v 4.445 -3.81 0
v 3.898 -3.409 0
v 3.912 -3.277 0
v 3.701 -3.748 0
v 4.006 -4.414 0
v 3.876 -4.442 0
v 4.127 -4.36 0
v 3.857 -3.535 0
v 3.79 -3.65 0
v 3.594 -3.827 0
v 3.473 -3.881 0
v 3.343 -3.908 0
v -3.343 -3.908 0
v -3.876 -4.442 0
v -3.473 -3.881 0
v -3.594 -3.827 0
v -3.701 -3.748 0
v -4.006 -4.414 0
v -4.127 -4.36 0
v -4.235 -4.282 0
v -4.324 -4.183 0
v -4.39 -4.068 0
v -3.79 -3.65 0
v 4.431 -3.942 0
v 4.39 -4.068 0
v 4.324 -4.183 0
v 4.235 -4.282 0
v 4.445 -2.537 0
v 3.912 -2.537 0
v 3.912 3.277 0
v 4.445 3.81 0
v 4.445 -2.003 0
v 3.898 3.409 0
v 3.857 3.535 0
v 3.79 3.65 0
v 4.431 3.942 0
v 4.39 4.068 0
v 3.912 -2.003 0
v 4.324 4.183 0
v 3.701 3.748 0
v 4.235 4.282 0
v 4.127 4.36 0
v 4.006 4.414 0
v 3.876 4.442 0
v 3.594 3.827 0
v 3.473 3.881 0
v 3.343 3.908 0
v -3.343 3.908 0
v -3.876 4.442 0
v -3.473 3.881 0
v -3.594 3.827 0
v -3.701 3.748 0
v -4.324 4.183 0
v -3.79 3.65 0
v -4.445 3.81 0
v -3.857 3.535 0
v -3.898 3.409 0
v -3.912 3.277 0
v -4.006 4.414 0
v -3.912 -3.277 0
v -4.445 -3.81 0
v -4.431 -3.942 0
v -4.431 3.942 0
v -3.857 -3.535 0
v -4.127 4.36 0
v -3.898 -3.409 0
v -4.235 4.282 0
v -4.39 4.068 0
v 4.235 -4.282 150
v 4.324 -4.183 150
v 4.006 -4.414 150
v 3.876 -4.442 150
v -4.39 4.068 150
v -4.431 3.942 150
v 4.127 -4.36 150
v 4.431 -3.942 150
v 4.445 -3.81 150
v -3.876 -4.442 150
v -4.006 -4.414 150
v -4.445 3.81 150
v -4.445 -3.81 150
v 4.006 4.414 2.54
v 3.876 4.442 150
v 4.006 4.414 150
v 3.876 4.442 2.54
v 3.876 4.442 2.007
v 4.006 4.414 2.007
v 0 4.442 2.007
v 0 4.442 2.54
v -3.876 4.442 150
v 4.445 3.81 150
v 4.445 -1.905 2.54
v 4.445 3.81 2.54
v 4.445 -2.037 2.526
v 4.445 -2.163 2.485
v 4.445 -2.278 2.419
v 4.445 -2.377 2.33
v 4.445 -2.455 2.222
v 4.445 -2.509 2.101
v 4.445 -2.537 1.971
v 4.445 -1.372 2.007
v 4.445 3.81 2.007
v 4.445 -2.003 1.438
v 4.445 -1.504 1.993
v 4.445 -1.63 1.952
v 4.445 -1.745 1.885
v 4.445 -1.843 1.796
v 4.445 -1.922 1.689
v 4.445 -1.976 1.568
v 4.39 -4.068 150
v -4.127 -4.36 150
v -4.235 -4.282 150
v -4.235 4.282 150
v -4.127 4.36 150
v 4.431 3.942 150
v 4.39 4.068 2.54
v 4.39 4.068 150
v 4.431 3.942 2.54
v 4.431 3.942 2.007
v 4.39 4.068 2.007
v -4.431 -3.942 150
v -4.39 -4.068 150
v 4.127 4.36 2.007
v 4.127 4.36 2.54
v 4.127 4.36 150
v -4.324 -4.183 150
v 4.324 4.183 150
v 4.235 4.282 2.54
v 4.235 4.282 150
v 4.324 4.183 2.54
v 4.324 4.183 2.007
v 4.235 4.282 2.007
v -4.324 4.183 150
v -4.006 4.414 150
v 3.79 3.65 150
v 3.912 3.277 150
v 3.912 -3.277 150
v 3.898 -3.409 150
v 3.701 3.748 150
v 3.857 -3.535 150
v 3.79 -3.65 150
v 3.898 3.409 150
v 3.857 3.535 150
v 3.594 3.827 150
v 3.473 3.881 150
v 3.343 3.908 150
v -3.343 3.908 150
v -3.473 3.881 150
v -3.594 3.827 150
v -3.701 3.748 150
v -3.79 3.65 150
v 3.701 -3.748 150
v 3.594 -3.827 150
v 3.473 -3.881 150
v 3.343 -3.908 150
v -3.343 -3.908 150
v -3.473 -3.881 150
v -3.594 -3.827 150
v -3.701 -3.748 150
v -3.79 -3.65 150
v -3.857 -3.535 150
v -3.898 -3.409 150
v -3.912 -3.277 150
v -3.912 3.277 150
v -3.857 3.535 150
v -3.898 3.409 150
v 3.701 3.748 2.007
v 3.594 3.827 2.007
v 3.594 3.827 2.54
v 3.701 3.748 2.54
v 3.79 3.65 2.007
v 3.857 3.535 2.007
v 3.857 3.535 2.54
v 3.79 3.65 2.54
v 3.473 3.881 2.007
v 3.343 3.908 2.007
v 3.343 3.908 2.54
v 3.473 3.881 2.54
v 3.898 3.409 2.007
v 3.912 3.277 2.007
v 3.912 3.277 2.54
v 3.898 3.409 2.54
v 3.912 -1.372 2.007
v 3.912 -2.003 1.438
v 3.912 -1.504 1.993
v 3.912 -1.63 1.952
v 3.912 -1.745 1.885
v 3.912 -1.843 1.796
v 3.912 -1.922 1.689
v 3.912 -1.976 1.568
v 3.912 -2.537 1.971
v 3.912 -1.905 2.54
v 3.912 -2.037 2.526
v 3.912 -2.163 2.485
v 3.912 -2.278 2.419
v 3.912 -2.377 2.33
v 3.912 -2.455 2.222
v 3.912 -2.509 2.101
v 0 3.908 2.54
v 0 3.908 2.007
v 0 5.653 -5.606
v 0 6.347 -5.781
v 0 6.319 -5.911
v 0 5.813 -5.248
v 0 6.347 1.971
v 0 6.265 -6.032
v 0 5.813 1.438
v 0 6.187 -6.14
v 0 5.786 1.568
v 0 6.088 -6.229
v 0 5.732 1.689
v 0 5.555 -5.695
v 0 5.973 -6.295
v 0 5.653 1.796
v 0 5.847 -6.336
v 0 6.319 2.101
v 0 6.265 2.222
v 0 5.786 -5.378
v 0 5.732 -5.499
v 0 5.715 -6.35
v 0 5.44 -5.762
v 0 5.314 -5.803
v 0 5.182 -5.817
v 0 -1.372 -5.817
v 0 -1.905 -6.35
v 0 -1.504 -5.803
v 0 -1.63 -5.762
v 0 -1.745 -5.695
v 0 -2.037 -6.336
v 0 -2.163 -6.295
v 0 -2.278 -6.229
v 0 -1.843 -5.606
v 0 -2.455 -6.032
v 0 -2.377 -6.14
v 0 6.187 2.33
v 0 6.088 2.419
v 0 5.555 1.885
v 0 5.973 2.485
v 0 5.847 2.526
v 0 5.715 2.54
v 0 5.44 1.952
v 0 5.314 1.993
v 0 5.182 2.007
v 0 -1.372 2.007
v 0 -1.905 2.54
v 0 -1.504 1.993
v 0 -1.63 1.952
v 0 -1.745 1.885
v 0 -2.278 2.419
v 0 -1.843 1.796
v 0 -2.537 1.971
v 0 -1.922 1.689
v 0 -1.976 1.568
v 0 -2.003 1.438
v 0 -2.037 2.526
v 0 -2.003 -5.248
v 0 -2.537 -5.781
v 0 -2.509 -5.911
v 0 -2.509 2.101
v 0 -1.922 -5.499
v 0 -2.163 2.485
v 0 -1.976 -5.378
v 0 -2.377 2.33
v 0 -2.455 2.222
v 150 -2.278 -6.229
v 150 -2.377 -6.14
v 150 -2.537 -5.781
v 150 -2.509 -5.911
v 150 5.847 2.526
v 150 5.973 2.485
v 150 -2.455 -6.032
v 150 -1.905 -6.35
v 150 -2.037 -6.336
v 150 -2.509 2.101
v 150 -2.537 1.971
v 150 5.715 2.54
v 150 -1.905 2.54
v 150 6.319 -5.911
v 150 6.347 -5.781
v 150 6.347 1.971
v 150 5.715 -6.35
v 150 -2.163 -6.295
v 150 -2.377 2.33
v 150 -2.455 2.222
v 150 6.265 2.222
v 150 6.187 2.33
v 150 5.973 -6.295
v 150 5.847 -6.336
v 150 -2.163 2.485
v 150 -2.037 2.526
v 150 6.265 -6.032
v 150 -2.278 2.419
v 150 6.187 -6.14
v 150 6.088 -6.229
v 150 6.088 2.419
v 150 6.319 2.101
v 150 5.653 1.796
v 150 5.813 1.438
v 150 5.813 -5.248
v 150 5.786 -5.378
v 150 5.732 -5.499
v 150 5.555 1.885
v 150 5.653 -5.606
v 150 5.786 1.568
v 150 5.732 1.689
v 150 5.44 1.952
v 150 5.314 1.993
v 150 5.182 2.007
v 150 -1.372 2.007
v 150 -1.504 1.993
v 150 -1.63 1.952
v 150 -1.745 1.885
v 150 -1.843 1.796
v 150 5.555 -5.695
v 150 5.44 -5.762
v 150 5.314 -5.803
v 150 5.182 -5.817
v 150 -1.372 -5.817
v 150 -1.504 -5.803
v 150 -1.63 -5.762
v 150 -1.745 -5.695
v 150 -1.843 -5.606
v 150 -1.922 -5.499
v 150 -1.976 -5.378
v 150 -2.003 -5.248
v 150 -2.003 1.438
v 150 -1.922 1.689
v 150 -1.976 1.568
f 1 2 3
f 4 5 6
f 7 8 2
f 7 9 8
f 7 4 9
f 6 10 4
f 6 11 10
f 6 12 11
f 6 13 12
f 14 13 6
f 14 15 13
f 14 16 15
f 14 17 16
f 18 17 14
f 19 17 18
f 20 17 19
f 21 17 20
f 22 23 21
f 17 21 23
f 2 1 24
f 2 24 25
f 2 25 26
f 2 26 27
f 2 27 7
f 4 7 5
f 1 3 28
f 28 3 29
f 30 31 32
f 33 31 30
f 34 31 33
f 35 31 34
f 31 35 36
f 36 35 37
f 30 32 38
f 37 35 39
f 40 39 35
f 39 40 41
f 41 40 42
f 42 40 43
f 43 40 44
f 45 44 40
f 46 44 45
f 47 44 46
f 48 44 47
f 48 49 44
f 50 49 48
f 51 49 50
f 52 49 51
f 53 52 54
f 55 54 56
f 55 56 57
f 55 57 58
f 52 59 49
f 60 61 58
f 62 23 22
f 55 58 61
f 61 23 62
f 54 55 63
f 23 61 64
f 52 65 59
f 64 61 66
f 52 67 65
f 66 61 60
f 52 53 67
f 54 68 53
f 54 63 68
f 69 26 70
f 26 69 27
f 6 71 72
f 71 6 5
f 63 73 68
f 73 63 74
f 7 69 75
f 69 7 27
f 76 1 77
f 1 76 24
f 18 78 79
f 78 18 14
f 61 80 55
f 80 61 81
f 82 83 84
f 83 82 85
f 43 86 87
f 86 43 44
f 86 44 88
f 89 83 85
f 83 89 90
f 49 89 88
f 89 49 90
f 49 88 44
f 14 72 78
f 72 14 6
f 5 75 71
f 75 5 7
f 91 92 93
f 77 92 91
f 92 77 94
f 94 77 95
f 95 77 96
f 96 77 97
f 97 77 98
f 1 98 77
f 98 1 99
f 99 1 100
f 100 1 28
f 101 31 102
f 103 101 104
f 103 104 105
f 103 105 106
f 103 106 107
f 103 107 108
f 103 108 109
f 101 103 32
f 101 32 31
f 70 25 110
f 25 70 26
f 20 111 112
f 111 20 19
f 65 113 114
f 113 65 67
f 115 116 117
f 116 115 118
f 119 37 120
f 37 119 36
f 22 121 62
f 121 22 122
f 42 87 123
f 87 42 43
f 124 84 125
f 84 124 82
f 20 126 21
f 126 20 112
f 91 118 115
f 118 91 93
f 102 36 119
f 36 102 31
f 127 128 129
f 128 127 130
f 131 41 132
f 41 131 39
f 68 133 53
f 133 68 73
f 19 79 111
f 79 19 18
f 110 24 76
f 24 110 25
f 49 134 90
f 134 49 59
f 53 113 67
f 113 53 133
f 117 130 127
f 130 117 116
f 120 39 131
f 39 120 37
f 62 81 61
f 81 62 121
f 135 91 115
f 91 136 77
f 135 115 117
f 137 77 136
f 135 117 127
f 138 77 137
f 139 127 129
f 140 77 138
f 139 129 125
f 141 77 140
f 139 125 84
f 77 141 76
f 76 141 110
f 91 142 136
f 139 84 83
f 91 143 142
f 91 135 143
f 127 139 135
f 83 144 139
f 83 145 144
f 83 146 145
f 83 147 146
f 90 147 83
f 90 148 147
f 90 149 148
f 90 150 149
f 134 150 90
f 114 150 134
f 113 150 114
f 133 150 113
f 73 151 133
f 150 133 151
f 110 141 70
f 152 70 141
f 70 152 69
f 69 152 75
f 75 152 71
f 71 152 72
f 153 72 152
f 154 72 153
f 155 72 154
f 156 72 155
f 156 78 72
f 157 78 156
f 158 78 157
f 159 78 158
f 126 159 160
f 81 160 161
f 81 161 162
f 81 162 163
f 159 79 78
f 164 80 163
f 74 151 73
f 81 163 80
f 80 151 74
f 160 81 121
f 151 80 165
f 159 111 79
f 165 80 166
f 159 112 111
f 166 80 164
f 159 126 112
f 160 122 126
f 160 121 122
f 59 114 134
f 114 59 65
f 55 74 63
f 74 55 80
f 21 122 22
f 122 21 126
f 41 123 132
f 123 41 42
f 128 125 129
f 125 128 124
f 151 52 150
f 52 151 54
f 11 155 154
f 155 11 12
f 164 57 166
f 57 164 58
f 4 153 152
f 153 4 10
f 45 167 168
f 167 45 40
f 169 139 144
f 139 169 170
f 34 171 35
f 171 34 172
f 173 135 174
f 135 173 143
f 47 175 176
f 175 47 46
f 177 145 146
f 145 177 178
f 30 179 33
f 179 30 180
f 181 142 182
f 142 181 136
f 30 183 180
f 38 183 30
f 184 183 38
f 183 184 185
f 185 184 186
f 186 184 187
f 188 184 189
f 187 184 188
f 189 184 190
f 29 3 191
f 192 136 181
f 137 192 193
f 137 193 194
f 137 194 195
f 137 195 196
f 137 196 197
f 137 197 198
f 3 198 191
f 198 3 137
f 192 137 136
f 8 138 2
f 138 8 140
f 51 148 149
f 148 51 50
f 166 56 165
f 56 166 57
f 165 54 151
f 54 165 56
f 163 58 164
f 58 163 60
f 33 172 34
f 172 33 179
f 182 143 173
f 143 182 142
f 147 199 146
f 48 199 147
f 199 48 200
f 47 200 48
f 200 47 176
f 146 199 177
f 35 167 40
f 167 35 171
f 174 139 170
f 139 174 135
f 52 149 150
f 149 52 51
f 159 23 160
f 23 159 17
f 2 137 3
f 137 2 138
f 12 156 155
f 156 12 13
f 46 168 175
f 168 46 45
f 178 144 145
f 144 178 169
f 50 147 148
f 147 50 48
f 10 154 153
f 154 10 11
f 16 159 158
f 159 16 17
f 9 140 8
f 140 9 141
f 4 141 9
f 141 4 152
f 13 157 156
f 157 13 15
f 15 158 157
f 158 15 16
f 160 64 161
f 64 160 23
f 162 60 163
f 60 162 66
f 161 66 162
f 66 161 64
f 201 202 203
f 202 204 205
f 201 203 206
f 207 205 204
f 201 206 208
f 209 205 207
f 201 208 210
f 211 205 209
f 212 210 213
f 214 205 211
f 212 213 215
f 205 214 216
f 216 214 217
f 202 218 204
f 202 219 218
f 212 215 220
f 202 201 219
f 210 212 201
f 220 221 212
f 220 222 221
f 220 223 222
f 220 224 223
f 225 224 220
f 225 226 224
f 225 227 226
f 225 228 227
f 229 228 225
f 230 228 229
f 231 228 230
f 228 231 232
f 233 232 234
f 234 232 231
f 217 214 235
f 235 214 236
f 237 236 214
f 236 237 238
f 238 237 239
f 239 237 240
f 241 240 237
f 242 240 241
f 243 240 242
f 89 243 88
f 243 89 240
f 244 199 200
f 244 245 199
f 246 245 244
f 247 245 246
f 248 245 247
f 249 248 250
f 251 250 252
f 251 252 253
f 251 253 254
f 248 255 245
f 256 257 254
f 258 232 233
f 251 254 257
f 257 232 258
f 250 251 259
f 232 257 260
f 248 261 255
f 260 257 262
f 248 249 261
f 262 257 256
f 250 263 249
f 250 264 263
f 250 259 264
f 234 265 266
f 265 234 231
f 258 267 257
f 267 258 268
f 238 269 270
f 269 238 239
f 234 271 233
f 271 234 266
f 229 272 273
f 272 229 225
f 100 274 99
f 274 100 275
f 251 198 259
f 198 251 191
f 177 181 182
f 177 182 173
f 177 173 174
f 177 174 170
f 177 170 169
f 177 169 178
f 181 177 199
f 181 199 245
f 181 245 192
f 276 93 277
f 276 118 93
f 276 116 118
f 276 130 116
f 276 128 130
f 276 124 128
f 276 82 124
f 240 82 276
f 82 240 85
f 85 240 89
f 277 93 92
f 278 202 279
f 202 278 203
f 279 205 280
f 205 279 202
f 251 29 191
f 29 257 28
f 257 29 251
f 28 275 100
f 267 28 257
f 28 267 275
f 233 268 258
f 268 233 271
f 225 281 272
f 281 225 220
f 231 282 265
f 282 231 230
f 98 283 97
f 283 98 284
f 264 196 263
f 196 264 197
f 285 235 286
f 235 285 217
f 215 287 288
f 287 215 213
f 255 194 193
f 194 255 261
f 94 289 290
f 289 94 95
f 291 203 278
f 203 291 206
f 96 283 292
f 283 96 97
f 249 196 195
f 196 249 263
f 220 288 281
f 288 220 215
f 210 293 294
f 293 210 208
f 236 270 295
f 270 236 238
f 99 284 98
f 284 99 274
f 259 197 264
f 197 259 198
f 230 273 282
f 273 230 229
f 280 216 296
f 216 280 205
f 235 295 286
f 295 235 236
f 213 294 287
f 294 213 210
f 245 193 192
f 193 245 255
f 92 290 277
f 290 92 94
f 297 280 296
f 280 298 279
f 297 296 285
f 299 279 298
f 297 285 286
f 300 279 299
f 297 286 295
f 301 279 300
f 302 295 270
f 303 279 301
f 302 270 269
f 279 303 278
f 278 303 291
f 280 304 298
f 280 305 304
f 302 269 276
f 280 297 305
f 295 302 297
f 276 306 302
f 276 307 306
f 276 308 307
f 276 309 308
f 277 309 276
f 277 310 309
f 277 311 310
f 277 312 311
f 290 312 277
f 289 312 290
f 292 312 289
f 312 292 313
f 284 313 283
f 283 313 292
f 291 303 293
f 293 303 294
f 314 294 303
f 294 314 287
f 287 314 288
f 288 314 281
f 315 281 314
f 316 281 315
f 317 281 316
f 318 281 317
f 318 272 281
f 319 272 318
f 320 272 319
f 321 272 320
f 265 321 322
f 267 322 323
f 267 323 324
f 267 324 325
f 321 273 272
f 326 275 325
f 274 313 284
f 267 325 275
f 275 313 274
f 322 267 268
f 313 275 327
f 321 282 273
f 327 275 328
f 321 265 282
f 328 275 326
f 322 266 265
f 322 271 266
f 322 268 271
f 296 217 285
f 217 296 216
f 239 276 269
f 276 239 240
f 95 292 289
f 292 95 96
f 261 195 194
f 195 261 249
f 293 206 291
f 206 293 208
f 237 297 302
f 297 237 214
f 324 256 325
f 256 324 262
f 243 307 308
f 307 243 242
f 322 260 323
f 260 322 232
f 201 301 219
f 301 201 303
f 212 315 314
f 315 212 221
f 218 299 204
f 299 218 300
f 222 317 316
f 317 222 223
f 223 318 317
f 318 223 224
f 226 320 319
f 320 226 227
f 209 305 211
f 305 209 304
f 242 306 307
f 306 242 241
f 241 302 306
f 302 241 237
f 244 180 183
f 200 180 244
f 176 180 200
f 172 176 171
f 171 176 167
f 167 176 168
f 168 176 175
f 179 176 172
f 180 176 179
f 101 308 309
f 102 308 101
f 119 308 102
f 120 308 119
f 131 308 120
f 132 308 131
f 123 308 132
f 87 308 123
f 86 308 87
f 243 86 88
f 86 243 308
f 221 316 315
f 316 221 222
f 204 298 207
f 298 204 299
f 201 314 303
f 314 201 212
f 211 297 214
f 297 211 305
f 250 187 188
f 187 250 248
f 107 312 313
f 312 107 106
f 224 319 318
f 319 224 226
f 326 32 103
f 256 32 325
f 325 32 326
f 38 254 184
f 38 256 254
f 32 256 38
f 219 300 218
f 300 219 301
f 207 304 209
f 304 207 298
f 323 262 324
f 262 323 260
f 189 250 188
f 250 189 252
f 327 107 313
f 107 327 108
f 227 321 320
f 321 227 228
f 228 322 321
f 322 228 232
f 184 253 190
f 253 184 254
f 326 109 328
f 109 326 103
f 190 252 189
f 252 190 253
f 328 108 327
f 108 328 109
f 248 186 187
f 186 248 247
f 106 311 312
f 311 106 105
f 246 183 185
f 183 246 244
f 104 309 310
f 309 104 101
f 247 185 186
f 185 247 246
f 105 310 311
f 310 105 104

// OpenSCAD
// file: Pamux.scad
littleLonger = 0.01;



echo(version=version());

 

x = [1, 0, 0];

y = [0, 1, 0];

z = [0, 0, 1];

 


module roundedSquareRod(sizeX, sizeY, length, cornerRadius)

{

   hull()

    {

        translate([-sizeX, -sizeY, 0]) {

            cylinder(r = cornerRadius, h = length);

        }

       

        

         translate([sizeX, -sizeY, 0]) {

            cylinder(r = cornerRadius, h = length);

        }

       

         translate([-sizeX, sizeY, 0]) {

            cylinder(r = cornerRadius, h = length);

        }

       

         translate([sizeX, sizeY, 0]) {

            cylinder(r = cornerRadius, h = length);

        }

    }

}


module make_ring_of(radius, count)
{
    for (a = [0 : count - 1]) {
        angle = a * 360 / count;
        translate(radius * [sin(angle), -cos(angle), 0])
            rotate([0, 0, angle])
                children();
    }
}



module roundedSquareTube(sizeX, sizeY, length, cornerRadius, wallThickness)
{
    difference() {

        roundedSquareRod(sizeX, sizeY, length, cornerRadius);

        translate([0,0,-littleLonger/2]) {

            roundedSquareRod(sizeX-wallThickness, sizeY-wallThickness, length+littleLonger, cornerRadius);

        }

    }

}

 

module miteredRoundedSquareTube(sizeX, sizeY, length, cornerRadius, wallThickness)

{

    roundedSquareTube(sizeX, sizeY, length, cornerRadius, wallThickness);

}
// main file
use <Pamux.scad> 

$fn=30;
$fs = 0.1;  // Don't generate smaller facets than 0.1 mm
$fa = 5;    // Don't generate larger angles than 5 degrees


steelTubeSize = 1.5 * 2.54;

steelTubeWallThickness = 0.210 * 2.54;

steelTubeCornerRadius = 0.25 * 2.54;
 
tableXSize = 150;
tableYSize = 150;

xTravel = 1300;
yTravel = 1300;
zTravel = 300;


module twoParallelTubes(color, length, distance, angle, pivot)
{
	color(color)
	{
		
		
		
			
		rotate(a = angle, v = pivot)
		{
			translate([steelTubeSize/2,steelTubeSize/2,0])
			{
				miteredRoundedSquareTube(steelTubeSize,   steelTubeSize, length, steelTubeCornerRadius, steelTubeWallThickness);
			}
			
		}
			
			
		translate(distance)
		{	
			rotate(a = angle, v = pivot)
			{
				translate([-steelTubeSize,-steelTubeSize,0])
				{
					//miteredRoundedSquareTube(steelTubeSize,   steelTubeSize, length,  steelTubeCornerRadius, steelTubeWallThickness);
				}
			}
		}
		
	}
}


module steelTubeFrame(xSize, ySize)
{
	
	miteredRoundedSquareTube(steelTubeSize,   steelTubeSize, xSize, steelTubeCornerRadius, steelTubeWallThickness);
	
	twoParallelTubes("red",   xSize, [0,ySize,0],  90, [0,1,0]);
	//twoParallelTubes("green", ySize, [-xSize,0, 0], -90, [1,0,0]);
}

module base()
{
  steelTubeFrame(tableXSize, tableYSize);
}

module supportedShafts()
{
}

module ballScrew()
{
}

module motor()
{
}

module gantry()
{
}

module toolHolder()
{
}

module yAxis()
{
  base();
  supportedShafts();
  ballScrew();
  motor();
}

module xAxis()
{
  gantry();
  supportedShafts();
  ballScrew();
  motor();
}

module zAxis()
{
  supportedShafts();
  ballScrew();
  toolHolder();
}
  
  
module movingGantry3AxisCnc()
{
  yAxis();
  xAxis();
  zAxis();
  
}
 

movingGantry3AxisCnc();
